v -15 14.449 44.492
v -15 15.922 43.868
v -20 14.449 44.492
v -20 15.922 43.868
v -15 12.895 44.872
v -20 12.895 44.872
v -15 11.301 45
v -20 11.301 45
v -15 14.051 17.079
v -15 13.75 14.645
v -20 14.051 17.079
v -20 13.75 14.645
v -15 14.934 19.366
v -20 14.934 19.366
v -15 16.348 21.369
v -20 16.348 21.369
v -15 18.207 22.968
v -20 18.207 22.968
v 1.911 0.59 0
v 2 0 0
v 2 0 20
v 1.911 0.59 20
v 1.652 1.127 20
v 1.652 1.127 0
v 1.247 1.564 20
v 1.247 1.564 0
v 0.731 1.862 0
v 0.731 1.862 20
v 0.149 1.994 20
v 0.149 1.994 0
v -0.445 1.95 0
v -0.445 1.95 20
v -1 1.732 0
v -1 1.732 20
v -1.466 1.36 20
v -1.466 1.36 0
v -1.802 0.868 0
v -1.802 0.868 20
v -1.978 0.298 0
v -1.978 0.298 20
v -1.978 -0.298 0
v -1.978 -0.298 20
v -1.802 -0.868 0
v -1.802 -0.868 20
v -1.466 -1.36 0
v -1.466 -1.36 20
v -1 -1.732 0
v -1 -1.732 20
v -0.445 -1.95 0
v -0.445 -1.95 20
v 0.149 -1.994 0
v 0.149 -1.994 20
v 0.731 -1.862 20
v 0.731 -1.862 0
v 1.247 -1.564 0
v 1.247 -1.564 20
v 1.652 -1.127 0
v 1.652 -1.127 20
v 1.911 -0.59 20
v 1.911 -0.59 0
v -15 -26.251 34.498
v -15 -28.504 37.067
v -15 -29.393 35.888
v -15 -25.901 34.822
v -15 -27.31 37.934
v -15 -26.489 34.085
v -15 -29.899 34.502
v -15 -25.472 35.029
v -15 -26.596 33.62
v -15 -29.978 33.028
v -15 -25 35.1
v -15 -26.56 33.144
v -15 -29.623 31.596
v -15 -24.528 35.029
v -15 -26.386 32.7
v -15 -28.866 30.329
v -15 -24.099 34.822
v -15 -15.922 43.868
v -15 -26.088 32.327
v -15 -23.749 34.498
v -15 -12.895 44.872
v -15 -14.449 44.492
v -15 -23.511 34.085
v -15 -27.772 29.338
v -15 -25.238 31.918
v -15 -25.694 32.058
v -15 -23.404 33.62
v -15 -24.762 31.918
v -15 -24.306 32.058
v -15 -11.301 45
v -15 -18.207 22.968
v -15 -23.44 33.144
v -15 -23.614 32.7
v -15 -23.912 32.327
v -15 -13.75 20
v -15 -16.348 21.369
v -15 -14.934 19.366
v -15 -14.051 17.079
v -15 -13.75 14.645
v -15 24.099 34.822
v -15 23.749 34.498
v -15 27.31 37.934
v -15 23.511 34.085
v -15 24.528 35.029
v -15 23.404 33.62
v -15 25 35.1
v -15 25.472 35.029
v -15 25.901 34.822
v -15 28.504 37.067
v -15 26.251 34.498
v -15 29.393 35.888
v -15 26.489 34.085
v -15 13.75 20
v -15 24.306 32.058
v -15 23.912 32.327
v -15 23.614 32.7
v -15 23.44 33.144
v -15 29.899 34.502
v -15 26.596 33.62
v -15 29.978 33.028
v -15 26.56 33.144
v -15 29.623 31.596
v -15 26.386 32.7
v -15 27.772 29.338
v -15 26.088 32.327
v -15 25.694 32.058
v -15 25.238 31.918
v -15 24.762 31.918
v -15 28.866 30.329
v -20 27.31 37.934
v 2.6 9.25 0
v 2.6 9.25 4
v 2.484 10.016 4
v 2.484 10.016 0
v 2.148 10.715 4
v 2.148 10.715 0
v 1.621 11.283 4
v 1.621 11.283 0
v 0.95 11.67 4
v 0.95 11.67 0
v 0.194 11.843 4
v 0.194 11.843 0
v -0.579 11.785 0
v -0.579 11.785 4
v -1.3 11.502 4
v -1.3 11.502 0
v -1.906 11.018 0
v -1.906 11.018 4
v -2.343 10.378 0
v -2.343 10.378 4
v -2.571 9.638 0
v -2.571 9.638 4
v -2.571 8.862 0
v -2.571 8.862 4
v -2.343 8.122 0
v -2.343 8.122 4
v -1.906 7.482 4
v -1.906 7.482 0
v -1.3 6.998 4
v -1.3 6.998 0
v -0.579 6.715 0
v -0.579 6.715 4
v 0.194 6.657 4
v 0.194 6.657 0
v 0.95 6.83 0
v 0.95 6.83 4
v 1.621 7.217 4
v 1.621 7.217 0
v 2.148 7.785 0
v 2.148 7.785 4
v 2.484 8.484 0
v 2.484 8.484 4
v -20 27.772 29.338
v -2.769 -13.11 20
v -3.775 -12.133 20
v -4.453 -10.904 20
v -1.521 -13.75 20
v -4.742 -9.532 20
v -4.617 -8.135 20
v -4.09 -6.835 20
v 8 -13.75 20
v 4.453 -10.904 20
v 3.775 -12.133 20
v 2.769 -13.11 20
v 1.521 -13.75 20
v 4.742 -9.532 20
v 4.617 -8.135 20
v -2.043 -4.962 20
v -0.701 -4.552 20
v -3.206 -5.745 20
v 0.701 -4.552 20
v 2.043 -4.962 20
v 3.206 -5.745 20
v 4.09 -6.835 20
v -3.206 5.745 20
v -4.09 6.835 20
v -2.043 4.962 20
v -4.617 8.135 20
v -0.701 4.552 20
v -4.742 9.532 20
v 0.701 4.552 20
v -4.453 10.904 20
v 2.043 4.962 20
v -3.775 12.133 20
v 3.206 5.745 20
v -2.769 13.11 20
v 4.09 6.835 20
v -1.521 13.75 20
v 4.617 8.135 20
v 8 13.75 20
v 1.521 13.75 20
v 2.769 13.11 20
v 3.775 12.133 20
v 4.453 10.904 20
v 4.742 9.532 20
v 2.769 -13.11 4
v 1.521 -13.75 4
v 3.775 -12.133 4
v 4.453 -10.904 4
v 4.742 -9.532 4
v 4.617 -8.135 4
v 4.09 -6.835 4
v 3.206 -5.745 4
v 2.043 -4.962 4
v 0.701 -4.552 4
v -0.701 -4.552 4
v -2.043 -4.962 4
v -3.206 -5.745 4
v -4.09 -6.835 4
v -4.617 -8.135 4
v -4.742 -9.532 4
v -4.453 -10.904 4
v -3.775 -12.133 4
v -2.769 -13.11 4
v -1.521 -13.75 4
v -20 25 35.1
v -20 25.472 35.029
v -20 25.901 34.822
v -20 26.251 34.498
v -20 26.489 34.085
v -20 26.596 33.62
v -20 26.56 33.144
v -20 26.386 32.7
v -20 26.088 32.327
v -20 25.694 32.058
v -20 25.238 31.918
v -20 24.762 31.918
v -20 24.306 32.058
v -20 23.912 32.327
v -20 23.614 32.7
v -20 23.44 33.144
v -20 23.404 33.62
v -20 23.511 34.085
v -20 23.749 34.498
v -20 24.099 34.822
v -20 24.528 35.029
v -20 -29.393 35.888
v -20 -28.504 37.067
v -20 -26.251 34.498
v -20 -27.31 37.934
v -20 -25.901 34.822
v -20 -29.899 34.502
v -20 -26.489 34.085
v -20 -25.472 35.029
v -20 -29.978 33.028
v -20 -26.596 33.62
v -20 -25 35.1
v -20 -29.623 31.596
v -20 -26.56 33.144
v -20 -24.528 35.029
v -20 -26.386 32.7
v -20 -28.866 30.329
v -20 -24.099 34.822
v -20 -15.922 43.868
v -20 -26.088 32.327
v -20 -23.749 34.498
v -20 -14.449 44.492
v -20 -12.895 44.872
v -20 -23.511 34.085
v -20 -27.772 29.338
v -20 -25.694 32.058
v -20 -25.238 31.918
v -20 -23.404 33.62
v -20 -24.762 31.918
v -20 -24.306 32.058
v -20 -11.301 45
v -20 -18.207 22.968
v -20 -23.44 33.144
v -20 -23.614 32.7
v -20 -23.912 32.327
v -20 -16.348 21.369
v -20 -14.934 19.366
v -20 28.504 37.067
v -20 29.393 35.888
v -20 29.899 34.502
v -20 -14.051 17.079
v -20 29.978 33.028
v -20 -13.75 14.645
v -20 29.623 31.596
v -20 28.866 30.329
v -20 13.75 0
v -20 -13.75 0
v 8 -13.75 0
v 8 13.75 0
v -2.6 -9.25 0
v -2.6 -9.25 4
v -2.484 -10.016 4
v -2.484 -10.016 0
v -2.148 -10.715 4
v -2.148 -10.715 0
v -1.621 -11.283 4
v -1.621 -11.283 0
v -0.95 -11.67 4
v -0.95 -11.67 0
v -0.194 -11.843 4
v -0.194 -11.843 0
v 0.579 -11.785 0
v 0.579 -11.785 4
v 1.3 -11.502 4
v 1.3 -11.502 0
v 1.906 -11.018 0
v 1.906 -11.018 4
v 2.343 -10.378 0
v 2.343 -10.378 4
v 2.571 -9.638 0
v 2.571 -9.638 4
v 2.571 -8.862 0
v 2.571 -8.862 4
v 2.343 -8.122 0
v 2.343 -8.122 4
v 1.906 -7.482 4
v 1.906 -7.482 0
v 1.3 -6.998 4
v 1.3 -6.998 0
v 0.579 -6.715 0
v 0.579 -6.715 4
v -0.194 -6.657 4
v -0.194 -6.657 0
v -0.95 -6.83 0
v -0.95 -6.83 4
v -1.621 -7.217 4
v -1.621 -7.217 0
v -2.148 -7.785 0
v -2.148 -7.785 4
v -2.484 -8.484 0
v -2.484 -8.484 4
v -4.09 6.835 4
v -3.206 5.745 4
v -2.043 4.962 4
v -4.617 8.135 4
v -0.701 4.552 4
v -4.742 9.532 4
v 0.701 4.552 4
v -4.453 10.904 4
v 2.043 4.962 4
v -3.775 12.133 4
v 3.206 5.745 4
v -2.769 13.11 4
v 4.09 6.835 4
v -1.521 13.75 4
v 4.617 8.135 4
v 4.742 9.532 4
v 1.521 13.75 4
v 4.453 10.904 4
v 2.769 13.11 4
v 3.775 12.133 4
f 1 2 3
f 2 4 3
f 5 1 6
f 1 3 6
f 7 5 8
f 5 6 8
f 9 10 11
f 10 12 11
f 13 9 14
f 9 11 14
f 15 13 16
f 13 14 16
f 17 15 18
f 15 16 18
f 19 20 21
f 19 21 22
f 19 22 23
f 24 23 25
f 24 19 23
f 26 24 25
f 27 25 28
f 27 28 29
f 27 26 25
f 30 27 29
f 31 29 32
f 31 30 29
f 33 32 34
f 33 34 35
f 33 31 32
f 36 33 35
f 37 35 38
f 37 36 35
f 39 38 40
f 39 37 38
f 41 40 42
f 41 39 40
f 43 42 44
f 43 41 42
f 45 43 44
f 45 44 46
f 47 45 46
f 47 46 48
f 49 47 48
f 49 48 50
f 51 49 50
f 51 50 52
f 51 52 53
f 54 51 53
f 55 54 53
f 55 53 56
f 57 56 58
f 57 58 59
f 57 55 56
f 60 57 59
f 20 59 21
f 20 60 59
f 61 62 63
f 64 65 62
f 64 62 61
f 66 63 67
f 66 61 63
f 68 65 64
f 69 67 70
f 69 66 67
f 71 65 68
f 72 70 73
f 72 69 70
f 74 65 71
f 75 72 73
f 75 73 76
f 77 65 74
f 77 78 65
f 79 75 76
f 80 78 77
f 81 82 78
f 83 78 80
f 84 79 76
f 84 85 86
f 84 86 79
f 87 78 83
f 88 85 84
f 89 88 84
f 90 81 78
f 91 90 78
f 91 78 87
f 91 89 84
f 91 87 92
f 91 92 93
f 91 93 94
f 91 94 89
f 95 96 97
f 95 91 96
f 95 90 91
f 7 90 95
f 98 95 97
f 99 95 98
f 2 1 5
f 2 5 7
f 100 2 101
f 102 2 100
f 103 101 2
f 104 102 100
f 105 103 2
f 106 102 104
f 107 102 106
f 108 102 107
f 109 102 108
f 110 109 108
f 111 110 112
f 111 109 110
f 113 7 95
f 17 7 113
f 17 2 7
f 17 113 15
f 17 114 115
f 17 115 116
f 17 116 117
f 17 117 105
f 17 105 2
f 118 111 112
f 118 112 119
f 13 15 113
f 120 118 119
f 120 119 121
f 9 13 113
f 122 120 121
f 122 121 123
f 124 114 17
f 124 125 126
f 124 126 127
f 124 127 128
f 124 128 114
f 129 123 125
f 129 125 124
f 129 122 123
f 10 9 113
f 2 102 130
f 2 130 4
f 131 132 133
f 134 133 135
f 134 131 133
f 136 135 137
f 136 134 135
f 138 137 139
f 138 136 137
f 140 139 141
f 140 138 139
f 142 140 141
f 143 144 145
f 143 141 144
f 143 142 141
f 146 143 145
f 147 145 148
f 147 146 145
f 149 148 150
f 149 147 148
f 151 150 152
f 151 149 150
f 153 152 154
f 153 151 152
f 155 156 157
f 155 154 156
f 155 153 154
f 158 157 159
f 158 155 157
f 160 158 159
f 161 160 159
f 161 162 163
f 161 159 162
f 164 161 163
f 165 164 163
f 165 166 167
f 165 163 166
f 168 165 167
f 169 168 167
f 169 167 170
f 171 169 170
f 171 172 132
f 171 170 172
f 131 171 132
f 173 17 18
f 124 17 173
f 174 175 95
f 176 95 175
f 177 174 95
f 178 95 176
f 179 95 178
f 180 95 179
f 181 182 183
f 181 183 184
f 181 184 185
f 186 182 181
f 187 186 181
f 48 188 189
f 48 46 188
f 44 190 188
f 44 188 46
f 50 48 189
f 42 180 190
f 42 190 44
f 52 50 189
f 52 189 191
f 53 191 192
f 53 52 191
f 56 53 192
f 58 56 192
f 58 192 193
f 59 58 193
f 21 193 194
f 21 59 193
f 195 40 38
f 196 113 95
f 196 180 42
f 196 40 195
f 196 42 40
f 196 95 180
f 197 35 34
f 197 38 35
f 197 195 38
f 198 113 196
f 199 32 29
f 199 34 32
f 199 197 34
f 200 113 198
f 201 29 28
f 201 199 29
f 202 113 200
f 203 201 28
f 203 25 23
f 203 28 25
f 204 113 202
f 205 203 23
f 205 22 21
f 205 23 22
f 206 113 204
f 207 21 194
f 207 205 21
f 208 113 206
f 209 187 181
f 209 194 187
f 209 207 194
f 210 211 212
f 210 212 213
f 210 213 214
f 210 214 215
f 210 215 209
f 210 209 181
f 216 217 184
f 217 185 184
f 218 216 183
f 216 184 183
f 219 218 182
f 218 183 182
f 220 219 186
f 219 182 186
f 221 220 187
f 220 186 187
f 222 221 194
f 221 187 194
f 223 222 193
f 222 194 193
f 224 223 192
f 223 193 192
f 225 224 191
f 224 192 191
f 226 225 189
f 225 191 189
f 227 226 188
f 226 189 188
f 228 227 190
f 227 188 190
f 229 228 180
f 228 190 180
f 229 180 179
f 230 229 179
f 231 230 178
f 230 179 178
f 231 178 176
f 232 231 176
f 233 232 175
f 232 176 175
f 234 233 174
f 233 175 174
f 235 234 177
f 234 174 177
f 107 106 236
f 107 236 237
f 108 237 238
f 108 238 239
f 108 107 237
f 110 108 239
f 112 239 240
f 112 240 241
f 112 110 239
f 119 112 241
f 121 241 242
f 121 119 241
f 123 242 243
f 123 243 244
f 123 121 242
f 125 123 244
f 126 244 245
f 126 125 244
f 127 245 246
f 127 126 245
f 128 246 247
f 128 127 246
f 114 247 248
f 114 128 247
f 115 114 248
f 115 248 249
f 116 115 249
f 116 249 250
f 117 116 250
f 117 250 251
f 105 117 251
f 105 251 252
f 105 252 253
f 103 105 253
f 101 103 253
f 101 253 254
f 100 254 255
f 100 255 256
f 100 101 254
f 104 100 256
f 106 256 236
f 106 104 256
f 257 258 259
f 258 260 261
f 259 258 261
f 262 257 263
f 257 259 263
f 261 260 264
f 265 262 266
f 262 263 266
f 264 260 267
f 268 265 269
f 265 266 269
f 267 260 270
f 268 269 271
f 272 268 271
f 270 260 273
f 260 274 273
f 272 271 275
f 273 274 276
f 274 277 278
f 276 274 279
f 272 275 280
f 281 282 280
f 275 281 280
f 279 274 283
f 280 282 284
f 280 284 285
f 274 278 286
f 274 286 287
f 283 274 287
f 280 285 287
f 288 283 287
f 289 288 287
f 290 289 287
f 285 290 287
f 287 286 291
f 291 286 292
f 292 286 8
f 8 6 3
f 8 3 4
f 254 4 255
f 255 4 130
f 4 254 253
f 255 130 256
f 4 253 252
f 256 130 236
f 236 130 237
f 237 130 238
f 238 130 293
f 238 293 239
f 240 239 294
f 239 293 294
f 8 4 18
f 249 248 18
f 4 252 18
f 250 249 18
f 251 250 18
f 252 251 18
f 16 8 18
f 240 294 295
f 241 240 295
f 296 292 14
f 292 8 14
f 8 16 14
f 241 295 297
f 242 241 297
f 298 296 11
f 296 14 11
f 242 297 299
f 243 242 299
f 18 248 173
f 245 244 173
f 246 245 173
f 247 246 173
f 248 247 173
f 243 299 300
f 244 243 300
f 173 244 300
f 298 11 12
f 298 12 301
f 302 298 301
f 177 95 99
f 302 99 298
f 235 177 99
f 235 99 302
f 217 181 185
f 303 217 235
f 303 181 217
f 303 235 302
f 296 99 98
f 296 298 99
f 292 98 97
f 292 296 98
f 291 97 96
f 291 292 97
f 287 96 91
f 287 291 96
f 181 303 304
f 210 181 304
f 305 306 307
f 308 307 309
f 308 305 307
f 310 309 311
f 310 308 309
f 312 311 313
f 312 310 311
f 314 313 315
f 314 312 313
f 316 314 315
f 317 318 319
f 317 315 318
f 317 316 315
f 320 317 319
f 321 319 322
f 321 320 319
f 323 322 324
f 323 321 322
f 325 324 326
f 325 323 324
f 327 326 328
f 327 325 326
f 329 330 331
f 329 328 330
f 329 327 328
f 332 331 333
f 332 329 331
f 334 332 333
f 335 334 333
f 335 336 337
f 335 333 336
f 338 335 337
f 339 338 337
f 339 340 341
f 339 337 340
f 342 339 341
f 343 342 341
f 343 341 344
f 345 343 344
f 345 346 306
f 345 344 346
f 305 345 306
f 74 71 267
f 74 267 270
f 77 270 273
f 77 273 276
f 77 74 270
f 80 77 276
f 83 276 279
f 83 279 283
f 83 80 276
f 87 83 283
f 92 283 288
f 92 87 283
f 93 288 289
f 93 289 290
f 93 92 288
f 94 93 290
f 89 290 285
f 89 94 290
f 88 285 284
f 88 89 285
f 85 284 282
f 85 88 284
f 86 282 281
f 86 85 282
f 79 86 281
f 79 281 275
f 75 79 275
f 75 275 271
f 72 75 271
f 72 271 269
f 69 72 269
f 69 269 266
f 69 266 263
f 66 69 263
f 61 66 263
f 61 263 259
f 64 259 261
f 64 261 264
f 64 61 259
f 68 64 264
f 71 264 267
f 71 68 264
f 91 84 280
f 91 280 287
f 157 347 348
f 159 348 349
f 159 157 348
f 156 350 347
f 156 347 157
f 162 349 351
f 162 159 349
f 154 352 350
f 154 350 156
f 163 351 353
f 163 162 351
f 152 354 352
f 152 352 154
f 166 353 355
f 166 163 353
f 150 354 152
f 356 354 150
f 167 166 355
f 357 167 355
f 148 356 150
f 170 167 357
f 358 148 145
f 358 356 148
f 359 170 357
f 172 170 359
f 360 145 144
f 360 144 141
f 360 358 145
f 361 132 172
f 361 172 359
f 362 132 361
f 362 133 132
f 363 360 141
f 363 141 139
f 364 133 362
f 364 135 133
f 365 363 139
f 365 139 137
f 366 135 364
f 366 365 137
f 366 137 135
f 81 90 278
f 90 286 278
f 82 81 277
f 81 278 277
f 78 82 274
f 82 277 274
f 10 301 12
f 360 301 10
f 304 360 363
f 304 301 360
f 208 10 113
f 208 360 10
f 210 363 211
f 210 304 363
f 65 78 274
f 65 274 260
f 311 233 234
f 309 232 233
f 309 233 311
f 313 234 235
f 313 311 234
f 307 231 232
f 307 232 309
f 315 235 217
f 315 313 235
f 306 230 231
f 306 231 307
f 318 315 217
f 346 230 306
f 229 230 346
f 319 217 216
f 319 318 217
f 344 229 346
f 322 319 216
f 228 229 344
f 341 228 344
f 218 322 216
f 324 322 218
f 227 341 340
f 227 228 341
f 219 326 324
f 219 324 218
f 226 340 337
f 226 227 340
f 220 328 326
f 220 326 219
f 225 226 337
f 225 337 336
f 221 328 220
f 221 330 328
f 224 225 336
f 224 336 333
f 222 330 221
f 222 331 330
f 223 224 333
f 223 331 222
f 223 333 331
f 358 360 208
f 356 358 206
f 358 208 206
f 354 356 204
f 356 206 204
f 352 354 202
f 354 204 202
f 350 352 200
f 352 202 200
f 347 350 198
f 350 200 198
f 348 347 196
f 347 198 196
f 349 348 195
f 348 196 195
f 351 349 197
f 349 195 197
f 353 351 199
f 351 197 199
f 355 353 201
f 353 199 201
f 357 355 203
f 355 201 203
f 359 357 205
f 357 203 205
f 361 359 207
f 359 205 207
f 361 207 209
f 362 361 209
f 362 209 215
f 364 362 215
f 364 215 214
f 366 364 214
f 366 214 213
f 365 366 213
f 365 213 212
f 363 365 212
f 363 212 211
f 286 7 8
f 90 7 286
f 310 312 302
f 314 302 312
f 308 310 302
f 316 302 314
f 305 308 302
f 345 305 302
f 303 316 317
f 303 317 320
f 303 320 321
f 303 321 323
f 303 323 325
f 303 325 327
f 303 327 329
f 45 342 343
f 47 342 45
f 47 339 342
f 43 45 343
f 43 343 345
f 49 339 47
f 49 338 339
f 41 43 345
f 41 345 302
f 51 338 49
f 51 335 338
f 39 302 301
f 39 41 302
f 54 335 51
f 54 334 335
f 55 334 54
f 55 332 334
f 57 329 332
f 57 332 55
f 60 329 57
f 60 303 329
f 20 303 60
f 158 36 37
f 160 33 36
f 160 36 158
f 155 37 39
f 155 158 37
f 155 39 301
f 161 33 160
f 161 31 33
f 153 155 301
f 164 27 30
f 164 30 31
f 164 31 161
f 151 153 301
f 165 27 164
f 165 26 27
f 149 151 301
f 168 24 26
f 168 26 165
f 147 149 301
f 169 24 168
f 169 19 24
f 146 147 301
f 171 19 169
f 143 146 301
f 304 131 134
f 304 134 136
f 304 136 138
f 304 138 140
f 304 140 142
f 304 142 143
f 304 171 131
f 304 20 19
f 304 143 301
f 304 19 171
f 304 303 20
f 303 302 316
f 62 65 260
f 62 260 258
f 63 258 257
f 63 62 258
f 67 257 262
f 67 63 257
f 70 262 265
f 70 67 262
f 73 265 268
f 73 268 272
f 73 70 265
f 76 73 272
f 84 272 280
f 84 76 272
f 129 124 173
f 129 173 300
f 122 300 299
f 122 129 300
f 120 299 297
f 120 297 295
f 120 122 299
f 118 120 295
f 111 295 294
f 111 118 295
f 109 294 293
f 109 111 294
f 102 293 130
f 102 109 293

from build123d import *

# Parameters (mm, degrees)
SKETCH_1_W          = 23
SKETCH_1_H          = 27.5
SKETCH_1_R          = 2.6
SKETCH_1_R_2        = 2
EXTRUDE_1_DEPTH     = 20
SKETCH_3_R          = 4.75
CUT_EXTRUDE_3_DEPTH = 16
SKETCH_2_R          = 1.6
EXTRUDE_2_DEPTH     = 5
FILLET_1_R          = 10


with BuildPart() as part:
    # 草图1 → 凸台-拉伸1 (new body)
    with BuildSketch(Plane.XY):
        with Locations((-3.5, 0)):
            Rectangle(SKETCH_1_W, SKETCH_1_H)
        with Locations((0, 9.25)):
            Circle(SKETCH_1_R, mode=Mode.SUBTRACT)
        with Locations(Location((0, -9.25, 0), (0, 0, 180))):
            Circle(SKETCH_1_R, mode=Mode.SUBTRACT)
        Circle(SKETCH_1_R_2, mode=Mode.SUBTRACT)
    extrude(amount=EXTRUDE_1_DEPTH)

    # 草图3 → 切除-拉伸3 (cut)
    with BuildSketch(Plane.XY.offset(20)):
        with Locations((0, 9.25)):
            Circle(SKETCH_3_R)
        with Locations((0, -9.25)):
            Circle(SKETCH_3_R)
    extrude(amount=-CUT_EXTRUDE_3_DEPTH, mode=Mode.SUBTRACT)

    # 草图2 → 凸台-拉伸2 (add)
    with BuildSketch(Plane.ZY.offset(15)):
        with BuildLine():
            Line((0, 13.75), (20, 13.75))
            Line((20, 13.75), (29.338481678, 27.771599764))
            ThreePointArc((29.338481678, 27.771599764), (33.767848759, 29.99282055), (37.93415499, 27.310469546))
            Line((37.93415499, 27.310469546), (45, 13.75))
            Line((45, 13.75), (45, -13.75))
            Line((45, -13.75), (37.93415499, -27.310469546))
            ThreePointArc((37.93415499, -27.310469546), (33.767848759, -29.99282055), (29.338481678, -27.771599764))
            Line((29.338481678, -27.771599764), (20, -13.75))
            Line((20, -13.75), (0, -13.75))
            Line((0, -13.75), (0, 13.75))
        make_face()
        with Locations((33.5, 25)):
            Circle(SKETCH_2_R, mode=Mode.SUBTRACT)
        with Locations((33.5, -25)):
            Circle(SKETCH_2_R, mode=Mode.SUBTRACT)
    extrude(amount=EXTRUDE_2_DEPTH)

    # 圆角1
    fillet_1_edges = [part.edges().sort_by_distance(p)[0] for p in [
        (-17.5, -13.75, 20),
        (-17.5, -13.75, 45),
        (-17.5, 13.75, 45),
        (-17.5, 13.75, 20),
    ]]
    fillet(fillet_1_edges, radius=FILLET_1_R)


solid = part.part
